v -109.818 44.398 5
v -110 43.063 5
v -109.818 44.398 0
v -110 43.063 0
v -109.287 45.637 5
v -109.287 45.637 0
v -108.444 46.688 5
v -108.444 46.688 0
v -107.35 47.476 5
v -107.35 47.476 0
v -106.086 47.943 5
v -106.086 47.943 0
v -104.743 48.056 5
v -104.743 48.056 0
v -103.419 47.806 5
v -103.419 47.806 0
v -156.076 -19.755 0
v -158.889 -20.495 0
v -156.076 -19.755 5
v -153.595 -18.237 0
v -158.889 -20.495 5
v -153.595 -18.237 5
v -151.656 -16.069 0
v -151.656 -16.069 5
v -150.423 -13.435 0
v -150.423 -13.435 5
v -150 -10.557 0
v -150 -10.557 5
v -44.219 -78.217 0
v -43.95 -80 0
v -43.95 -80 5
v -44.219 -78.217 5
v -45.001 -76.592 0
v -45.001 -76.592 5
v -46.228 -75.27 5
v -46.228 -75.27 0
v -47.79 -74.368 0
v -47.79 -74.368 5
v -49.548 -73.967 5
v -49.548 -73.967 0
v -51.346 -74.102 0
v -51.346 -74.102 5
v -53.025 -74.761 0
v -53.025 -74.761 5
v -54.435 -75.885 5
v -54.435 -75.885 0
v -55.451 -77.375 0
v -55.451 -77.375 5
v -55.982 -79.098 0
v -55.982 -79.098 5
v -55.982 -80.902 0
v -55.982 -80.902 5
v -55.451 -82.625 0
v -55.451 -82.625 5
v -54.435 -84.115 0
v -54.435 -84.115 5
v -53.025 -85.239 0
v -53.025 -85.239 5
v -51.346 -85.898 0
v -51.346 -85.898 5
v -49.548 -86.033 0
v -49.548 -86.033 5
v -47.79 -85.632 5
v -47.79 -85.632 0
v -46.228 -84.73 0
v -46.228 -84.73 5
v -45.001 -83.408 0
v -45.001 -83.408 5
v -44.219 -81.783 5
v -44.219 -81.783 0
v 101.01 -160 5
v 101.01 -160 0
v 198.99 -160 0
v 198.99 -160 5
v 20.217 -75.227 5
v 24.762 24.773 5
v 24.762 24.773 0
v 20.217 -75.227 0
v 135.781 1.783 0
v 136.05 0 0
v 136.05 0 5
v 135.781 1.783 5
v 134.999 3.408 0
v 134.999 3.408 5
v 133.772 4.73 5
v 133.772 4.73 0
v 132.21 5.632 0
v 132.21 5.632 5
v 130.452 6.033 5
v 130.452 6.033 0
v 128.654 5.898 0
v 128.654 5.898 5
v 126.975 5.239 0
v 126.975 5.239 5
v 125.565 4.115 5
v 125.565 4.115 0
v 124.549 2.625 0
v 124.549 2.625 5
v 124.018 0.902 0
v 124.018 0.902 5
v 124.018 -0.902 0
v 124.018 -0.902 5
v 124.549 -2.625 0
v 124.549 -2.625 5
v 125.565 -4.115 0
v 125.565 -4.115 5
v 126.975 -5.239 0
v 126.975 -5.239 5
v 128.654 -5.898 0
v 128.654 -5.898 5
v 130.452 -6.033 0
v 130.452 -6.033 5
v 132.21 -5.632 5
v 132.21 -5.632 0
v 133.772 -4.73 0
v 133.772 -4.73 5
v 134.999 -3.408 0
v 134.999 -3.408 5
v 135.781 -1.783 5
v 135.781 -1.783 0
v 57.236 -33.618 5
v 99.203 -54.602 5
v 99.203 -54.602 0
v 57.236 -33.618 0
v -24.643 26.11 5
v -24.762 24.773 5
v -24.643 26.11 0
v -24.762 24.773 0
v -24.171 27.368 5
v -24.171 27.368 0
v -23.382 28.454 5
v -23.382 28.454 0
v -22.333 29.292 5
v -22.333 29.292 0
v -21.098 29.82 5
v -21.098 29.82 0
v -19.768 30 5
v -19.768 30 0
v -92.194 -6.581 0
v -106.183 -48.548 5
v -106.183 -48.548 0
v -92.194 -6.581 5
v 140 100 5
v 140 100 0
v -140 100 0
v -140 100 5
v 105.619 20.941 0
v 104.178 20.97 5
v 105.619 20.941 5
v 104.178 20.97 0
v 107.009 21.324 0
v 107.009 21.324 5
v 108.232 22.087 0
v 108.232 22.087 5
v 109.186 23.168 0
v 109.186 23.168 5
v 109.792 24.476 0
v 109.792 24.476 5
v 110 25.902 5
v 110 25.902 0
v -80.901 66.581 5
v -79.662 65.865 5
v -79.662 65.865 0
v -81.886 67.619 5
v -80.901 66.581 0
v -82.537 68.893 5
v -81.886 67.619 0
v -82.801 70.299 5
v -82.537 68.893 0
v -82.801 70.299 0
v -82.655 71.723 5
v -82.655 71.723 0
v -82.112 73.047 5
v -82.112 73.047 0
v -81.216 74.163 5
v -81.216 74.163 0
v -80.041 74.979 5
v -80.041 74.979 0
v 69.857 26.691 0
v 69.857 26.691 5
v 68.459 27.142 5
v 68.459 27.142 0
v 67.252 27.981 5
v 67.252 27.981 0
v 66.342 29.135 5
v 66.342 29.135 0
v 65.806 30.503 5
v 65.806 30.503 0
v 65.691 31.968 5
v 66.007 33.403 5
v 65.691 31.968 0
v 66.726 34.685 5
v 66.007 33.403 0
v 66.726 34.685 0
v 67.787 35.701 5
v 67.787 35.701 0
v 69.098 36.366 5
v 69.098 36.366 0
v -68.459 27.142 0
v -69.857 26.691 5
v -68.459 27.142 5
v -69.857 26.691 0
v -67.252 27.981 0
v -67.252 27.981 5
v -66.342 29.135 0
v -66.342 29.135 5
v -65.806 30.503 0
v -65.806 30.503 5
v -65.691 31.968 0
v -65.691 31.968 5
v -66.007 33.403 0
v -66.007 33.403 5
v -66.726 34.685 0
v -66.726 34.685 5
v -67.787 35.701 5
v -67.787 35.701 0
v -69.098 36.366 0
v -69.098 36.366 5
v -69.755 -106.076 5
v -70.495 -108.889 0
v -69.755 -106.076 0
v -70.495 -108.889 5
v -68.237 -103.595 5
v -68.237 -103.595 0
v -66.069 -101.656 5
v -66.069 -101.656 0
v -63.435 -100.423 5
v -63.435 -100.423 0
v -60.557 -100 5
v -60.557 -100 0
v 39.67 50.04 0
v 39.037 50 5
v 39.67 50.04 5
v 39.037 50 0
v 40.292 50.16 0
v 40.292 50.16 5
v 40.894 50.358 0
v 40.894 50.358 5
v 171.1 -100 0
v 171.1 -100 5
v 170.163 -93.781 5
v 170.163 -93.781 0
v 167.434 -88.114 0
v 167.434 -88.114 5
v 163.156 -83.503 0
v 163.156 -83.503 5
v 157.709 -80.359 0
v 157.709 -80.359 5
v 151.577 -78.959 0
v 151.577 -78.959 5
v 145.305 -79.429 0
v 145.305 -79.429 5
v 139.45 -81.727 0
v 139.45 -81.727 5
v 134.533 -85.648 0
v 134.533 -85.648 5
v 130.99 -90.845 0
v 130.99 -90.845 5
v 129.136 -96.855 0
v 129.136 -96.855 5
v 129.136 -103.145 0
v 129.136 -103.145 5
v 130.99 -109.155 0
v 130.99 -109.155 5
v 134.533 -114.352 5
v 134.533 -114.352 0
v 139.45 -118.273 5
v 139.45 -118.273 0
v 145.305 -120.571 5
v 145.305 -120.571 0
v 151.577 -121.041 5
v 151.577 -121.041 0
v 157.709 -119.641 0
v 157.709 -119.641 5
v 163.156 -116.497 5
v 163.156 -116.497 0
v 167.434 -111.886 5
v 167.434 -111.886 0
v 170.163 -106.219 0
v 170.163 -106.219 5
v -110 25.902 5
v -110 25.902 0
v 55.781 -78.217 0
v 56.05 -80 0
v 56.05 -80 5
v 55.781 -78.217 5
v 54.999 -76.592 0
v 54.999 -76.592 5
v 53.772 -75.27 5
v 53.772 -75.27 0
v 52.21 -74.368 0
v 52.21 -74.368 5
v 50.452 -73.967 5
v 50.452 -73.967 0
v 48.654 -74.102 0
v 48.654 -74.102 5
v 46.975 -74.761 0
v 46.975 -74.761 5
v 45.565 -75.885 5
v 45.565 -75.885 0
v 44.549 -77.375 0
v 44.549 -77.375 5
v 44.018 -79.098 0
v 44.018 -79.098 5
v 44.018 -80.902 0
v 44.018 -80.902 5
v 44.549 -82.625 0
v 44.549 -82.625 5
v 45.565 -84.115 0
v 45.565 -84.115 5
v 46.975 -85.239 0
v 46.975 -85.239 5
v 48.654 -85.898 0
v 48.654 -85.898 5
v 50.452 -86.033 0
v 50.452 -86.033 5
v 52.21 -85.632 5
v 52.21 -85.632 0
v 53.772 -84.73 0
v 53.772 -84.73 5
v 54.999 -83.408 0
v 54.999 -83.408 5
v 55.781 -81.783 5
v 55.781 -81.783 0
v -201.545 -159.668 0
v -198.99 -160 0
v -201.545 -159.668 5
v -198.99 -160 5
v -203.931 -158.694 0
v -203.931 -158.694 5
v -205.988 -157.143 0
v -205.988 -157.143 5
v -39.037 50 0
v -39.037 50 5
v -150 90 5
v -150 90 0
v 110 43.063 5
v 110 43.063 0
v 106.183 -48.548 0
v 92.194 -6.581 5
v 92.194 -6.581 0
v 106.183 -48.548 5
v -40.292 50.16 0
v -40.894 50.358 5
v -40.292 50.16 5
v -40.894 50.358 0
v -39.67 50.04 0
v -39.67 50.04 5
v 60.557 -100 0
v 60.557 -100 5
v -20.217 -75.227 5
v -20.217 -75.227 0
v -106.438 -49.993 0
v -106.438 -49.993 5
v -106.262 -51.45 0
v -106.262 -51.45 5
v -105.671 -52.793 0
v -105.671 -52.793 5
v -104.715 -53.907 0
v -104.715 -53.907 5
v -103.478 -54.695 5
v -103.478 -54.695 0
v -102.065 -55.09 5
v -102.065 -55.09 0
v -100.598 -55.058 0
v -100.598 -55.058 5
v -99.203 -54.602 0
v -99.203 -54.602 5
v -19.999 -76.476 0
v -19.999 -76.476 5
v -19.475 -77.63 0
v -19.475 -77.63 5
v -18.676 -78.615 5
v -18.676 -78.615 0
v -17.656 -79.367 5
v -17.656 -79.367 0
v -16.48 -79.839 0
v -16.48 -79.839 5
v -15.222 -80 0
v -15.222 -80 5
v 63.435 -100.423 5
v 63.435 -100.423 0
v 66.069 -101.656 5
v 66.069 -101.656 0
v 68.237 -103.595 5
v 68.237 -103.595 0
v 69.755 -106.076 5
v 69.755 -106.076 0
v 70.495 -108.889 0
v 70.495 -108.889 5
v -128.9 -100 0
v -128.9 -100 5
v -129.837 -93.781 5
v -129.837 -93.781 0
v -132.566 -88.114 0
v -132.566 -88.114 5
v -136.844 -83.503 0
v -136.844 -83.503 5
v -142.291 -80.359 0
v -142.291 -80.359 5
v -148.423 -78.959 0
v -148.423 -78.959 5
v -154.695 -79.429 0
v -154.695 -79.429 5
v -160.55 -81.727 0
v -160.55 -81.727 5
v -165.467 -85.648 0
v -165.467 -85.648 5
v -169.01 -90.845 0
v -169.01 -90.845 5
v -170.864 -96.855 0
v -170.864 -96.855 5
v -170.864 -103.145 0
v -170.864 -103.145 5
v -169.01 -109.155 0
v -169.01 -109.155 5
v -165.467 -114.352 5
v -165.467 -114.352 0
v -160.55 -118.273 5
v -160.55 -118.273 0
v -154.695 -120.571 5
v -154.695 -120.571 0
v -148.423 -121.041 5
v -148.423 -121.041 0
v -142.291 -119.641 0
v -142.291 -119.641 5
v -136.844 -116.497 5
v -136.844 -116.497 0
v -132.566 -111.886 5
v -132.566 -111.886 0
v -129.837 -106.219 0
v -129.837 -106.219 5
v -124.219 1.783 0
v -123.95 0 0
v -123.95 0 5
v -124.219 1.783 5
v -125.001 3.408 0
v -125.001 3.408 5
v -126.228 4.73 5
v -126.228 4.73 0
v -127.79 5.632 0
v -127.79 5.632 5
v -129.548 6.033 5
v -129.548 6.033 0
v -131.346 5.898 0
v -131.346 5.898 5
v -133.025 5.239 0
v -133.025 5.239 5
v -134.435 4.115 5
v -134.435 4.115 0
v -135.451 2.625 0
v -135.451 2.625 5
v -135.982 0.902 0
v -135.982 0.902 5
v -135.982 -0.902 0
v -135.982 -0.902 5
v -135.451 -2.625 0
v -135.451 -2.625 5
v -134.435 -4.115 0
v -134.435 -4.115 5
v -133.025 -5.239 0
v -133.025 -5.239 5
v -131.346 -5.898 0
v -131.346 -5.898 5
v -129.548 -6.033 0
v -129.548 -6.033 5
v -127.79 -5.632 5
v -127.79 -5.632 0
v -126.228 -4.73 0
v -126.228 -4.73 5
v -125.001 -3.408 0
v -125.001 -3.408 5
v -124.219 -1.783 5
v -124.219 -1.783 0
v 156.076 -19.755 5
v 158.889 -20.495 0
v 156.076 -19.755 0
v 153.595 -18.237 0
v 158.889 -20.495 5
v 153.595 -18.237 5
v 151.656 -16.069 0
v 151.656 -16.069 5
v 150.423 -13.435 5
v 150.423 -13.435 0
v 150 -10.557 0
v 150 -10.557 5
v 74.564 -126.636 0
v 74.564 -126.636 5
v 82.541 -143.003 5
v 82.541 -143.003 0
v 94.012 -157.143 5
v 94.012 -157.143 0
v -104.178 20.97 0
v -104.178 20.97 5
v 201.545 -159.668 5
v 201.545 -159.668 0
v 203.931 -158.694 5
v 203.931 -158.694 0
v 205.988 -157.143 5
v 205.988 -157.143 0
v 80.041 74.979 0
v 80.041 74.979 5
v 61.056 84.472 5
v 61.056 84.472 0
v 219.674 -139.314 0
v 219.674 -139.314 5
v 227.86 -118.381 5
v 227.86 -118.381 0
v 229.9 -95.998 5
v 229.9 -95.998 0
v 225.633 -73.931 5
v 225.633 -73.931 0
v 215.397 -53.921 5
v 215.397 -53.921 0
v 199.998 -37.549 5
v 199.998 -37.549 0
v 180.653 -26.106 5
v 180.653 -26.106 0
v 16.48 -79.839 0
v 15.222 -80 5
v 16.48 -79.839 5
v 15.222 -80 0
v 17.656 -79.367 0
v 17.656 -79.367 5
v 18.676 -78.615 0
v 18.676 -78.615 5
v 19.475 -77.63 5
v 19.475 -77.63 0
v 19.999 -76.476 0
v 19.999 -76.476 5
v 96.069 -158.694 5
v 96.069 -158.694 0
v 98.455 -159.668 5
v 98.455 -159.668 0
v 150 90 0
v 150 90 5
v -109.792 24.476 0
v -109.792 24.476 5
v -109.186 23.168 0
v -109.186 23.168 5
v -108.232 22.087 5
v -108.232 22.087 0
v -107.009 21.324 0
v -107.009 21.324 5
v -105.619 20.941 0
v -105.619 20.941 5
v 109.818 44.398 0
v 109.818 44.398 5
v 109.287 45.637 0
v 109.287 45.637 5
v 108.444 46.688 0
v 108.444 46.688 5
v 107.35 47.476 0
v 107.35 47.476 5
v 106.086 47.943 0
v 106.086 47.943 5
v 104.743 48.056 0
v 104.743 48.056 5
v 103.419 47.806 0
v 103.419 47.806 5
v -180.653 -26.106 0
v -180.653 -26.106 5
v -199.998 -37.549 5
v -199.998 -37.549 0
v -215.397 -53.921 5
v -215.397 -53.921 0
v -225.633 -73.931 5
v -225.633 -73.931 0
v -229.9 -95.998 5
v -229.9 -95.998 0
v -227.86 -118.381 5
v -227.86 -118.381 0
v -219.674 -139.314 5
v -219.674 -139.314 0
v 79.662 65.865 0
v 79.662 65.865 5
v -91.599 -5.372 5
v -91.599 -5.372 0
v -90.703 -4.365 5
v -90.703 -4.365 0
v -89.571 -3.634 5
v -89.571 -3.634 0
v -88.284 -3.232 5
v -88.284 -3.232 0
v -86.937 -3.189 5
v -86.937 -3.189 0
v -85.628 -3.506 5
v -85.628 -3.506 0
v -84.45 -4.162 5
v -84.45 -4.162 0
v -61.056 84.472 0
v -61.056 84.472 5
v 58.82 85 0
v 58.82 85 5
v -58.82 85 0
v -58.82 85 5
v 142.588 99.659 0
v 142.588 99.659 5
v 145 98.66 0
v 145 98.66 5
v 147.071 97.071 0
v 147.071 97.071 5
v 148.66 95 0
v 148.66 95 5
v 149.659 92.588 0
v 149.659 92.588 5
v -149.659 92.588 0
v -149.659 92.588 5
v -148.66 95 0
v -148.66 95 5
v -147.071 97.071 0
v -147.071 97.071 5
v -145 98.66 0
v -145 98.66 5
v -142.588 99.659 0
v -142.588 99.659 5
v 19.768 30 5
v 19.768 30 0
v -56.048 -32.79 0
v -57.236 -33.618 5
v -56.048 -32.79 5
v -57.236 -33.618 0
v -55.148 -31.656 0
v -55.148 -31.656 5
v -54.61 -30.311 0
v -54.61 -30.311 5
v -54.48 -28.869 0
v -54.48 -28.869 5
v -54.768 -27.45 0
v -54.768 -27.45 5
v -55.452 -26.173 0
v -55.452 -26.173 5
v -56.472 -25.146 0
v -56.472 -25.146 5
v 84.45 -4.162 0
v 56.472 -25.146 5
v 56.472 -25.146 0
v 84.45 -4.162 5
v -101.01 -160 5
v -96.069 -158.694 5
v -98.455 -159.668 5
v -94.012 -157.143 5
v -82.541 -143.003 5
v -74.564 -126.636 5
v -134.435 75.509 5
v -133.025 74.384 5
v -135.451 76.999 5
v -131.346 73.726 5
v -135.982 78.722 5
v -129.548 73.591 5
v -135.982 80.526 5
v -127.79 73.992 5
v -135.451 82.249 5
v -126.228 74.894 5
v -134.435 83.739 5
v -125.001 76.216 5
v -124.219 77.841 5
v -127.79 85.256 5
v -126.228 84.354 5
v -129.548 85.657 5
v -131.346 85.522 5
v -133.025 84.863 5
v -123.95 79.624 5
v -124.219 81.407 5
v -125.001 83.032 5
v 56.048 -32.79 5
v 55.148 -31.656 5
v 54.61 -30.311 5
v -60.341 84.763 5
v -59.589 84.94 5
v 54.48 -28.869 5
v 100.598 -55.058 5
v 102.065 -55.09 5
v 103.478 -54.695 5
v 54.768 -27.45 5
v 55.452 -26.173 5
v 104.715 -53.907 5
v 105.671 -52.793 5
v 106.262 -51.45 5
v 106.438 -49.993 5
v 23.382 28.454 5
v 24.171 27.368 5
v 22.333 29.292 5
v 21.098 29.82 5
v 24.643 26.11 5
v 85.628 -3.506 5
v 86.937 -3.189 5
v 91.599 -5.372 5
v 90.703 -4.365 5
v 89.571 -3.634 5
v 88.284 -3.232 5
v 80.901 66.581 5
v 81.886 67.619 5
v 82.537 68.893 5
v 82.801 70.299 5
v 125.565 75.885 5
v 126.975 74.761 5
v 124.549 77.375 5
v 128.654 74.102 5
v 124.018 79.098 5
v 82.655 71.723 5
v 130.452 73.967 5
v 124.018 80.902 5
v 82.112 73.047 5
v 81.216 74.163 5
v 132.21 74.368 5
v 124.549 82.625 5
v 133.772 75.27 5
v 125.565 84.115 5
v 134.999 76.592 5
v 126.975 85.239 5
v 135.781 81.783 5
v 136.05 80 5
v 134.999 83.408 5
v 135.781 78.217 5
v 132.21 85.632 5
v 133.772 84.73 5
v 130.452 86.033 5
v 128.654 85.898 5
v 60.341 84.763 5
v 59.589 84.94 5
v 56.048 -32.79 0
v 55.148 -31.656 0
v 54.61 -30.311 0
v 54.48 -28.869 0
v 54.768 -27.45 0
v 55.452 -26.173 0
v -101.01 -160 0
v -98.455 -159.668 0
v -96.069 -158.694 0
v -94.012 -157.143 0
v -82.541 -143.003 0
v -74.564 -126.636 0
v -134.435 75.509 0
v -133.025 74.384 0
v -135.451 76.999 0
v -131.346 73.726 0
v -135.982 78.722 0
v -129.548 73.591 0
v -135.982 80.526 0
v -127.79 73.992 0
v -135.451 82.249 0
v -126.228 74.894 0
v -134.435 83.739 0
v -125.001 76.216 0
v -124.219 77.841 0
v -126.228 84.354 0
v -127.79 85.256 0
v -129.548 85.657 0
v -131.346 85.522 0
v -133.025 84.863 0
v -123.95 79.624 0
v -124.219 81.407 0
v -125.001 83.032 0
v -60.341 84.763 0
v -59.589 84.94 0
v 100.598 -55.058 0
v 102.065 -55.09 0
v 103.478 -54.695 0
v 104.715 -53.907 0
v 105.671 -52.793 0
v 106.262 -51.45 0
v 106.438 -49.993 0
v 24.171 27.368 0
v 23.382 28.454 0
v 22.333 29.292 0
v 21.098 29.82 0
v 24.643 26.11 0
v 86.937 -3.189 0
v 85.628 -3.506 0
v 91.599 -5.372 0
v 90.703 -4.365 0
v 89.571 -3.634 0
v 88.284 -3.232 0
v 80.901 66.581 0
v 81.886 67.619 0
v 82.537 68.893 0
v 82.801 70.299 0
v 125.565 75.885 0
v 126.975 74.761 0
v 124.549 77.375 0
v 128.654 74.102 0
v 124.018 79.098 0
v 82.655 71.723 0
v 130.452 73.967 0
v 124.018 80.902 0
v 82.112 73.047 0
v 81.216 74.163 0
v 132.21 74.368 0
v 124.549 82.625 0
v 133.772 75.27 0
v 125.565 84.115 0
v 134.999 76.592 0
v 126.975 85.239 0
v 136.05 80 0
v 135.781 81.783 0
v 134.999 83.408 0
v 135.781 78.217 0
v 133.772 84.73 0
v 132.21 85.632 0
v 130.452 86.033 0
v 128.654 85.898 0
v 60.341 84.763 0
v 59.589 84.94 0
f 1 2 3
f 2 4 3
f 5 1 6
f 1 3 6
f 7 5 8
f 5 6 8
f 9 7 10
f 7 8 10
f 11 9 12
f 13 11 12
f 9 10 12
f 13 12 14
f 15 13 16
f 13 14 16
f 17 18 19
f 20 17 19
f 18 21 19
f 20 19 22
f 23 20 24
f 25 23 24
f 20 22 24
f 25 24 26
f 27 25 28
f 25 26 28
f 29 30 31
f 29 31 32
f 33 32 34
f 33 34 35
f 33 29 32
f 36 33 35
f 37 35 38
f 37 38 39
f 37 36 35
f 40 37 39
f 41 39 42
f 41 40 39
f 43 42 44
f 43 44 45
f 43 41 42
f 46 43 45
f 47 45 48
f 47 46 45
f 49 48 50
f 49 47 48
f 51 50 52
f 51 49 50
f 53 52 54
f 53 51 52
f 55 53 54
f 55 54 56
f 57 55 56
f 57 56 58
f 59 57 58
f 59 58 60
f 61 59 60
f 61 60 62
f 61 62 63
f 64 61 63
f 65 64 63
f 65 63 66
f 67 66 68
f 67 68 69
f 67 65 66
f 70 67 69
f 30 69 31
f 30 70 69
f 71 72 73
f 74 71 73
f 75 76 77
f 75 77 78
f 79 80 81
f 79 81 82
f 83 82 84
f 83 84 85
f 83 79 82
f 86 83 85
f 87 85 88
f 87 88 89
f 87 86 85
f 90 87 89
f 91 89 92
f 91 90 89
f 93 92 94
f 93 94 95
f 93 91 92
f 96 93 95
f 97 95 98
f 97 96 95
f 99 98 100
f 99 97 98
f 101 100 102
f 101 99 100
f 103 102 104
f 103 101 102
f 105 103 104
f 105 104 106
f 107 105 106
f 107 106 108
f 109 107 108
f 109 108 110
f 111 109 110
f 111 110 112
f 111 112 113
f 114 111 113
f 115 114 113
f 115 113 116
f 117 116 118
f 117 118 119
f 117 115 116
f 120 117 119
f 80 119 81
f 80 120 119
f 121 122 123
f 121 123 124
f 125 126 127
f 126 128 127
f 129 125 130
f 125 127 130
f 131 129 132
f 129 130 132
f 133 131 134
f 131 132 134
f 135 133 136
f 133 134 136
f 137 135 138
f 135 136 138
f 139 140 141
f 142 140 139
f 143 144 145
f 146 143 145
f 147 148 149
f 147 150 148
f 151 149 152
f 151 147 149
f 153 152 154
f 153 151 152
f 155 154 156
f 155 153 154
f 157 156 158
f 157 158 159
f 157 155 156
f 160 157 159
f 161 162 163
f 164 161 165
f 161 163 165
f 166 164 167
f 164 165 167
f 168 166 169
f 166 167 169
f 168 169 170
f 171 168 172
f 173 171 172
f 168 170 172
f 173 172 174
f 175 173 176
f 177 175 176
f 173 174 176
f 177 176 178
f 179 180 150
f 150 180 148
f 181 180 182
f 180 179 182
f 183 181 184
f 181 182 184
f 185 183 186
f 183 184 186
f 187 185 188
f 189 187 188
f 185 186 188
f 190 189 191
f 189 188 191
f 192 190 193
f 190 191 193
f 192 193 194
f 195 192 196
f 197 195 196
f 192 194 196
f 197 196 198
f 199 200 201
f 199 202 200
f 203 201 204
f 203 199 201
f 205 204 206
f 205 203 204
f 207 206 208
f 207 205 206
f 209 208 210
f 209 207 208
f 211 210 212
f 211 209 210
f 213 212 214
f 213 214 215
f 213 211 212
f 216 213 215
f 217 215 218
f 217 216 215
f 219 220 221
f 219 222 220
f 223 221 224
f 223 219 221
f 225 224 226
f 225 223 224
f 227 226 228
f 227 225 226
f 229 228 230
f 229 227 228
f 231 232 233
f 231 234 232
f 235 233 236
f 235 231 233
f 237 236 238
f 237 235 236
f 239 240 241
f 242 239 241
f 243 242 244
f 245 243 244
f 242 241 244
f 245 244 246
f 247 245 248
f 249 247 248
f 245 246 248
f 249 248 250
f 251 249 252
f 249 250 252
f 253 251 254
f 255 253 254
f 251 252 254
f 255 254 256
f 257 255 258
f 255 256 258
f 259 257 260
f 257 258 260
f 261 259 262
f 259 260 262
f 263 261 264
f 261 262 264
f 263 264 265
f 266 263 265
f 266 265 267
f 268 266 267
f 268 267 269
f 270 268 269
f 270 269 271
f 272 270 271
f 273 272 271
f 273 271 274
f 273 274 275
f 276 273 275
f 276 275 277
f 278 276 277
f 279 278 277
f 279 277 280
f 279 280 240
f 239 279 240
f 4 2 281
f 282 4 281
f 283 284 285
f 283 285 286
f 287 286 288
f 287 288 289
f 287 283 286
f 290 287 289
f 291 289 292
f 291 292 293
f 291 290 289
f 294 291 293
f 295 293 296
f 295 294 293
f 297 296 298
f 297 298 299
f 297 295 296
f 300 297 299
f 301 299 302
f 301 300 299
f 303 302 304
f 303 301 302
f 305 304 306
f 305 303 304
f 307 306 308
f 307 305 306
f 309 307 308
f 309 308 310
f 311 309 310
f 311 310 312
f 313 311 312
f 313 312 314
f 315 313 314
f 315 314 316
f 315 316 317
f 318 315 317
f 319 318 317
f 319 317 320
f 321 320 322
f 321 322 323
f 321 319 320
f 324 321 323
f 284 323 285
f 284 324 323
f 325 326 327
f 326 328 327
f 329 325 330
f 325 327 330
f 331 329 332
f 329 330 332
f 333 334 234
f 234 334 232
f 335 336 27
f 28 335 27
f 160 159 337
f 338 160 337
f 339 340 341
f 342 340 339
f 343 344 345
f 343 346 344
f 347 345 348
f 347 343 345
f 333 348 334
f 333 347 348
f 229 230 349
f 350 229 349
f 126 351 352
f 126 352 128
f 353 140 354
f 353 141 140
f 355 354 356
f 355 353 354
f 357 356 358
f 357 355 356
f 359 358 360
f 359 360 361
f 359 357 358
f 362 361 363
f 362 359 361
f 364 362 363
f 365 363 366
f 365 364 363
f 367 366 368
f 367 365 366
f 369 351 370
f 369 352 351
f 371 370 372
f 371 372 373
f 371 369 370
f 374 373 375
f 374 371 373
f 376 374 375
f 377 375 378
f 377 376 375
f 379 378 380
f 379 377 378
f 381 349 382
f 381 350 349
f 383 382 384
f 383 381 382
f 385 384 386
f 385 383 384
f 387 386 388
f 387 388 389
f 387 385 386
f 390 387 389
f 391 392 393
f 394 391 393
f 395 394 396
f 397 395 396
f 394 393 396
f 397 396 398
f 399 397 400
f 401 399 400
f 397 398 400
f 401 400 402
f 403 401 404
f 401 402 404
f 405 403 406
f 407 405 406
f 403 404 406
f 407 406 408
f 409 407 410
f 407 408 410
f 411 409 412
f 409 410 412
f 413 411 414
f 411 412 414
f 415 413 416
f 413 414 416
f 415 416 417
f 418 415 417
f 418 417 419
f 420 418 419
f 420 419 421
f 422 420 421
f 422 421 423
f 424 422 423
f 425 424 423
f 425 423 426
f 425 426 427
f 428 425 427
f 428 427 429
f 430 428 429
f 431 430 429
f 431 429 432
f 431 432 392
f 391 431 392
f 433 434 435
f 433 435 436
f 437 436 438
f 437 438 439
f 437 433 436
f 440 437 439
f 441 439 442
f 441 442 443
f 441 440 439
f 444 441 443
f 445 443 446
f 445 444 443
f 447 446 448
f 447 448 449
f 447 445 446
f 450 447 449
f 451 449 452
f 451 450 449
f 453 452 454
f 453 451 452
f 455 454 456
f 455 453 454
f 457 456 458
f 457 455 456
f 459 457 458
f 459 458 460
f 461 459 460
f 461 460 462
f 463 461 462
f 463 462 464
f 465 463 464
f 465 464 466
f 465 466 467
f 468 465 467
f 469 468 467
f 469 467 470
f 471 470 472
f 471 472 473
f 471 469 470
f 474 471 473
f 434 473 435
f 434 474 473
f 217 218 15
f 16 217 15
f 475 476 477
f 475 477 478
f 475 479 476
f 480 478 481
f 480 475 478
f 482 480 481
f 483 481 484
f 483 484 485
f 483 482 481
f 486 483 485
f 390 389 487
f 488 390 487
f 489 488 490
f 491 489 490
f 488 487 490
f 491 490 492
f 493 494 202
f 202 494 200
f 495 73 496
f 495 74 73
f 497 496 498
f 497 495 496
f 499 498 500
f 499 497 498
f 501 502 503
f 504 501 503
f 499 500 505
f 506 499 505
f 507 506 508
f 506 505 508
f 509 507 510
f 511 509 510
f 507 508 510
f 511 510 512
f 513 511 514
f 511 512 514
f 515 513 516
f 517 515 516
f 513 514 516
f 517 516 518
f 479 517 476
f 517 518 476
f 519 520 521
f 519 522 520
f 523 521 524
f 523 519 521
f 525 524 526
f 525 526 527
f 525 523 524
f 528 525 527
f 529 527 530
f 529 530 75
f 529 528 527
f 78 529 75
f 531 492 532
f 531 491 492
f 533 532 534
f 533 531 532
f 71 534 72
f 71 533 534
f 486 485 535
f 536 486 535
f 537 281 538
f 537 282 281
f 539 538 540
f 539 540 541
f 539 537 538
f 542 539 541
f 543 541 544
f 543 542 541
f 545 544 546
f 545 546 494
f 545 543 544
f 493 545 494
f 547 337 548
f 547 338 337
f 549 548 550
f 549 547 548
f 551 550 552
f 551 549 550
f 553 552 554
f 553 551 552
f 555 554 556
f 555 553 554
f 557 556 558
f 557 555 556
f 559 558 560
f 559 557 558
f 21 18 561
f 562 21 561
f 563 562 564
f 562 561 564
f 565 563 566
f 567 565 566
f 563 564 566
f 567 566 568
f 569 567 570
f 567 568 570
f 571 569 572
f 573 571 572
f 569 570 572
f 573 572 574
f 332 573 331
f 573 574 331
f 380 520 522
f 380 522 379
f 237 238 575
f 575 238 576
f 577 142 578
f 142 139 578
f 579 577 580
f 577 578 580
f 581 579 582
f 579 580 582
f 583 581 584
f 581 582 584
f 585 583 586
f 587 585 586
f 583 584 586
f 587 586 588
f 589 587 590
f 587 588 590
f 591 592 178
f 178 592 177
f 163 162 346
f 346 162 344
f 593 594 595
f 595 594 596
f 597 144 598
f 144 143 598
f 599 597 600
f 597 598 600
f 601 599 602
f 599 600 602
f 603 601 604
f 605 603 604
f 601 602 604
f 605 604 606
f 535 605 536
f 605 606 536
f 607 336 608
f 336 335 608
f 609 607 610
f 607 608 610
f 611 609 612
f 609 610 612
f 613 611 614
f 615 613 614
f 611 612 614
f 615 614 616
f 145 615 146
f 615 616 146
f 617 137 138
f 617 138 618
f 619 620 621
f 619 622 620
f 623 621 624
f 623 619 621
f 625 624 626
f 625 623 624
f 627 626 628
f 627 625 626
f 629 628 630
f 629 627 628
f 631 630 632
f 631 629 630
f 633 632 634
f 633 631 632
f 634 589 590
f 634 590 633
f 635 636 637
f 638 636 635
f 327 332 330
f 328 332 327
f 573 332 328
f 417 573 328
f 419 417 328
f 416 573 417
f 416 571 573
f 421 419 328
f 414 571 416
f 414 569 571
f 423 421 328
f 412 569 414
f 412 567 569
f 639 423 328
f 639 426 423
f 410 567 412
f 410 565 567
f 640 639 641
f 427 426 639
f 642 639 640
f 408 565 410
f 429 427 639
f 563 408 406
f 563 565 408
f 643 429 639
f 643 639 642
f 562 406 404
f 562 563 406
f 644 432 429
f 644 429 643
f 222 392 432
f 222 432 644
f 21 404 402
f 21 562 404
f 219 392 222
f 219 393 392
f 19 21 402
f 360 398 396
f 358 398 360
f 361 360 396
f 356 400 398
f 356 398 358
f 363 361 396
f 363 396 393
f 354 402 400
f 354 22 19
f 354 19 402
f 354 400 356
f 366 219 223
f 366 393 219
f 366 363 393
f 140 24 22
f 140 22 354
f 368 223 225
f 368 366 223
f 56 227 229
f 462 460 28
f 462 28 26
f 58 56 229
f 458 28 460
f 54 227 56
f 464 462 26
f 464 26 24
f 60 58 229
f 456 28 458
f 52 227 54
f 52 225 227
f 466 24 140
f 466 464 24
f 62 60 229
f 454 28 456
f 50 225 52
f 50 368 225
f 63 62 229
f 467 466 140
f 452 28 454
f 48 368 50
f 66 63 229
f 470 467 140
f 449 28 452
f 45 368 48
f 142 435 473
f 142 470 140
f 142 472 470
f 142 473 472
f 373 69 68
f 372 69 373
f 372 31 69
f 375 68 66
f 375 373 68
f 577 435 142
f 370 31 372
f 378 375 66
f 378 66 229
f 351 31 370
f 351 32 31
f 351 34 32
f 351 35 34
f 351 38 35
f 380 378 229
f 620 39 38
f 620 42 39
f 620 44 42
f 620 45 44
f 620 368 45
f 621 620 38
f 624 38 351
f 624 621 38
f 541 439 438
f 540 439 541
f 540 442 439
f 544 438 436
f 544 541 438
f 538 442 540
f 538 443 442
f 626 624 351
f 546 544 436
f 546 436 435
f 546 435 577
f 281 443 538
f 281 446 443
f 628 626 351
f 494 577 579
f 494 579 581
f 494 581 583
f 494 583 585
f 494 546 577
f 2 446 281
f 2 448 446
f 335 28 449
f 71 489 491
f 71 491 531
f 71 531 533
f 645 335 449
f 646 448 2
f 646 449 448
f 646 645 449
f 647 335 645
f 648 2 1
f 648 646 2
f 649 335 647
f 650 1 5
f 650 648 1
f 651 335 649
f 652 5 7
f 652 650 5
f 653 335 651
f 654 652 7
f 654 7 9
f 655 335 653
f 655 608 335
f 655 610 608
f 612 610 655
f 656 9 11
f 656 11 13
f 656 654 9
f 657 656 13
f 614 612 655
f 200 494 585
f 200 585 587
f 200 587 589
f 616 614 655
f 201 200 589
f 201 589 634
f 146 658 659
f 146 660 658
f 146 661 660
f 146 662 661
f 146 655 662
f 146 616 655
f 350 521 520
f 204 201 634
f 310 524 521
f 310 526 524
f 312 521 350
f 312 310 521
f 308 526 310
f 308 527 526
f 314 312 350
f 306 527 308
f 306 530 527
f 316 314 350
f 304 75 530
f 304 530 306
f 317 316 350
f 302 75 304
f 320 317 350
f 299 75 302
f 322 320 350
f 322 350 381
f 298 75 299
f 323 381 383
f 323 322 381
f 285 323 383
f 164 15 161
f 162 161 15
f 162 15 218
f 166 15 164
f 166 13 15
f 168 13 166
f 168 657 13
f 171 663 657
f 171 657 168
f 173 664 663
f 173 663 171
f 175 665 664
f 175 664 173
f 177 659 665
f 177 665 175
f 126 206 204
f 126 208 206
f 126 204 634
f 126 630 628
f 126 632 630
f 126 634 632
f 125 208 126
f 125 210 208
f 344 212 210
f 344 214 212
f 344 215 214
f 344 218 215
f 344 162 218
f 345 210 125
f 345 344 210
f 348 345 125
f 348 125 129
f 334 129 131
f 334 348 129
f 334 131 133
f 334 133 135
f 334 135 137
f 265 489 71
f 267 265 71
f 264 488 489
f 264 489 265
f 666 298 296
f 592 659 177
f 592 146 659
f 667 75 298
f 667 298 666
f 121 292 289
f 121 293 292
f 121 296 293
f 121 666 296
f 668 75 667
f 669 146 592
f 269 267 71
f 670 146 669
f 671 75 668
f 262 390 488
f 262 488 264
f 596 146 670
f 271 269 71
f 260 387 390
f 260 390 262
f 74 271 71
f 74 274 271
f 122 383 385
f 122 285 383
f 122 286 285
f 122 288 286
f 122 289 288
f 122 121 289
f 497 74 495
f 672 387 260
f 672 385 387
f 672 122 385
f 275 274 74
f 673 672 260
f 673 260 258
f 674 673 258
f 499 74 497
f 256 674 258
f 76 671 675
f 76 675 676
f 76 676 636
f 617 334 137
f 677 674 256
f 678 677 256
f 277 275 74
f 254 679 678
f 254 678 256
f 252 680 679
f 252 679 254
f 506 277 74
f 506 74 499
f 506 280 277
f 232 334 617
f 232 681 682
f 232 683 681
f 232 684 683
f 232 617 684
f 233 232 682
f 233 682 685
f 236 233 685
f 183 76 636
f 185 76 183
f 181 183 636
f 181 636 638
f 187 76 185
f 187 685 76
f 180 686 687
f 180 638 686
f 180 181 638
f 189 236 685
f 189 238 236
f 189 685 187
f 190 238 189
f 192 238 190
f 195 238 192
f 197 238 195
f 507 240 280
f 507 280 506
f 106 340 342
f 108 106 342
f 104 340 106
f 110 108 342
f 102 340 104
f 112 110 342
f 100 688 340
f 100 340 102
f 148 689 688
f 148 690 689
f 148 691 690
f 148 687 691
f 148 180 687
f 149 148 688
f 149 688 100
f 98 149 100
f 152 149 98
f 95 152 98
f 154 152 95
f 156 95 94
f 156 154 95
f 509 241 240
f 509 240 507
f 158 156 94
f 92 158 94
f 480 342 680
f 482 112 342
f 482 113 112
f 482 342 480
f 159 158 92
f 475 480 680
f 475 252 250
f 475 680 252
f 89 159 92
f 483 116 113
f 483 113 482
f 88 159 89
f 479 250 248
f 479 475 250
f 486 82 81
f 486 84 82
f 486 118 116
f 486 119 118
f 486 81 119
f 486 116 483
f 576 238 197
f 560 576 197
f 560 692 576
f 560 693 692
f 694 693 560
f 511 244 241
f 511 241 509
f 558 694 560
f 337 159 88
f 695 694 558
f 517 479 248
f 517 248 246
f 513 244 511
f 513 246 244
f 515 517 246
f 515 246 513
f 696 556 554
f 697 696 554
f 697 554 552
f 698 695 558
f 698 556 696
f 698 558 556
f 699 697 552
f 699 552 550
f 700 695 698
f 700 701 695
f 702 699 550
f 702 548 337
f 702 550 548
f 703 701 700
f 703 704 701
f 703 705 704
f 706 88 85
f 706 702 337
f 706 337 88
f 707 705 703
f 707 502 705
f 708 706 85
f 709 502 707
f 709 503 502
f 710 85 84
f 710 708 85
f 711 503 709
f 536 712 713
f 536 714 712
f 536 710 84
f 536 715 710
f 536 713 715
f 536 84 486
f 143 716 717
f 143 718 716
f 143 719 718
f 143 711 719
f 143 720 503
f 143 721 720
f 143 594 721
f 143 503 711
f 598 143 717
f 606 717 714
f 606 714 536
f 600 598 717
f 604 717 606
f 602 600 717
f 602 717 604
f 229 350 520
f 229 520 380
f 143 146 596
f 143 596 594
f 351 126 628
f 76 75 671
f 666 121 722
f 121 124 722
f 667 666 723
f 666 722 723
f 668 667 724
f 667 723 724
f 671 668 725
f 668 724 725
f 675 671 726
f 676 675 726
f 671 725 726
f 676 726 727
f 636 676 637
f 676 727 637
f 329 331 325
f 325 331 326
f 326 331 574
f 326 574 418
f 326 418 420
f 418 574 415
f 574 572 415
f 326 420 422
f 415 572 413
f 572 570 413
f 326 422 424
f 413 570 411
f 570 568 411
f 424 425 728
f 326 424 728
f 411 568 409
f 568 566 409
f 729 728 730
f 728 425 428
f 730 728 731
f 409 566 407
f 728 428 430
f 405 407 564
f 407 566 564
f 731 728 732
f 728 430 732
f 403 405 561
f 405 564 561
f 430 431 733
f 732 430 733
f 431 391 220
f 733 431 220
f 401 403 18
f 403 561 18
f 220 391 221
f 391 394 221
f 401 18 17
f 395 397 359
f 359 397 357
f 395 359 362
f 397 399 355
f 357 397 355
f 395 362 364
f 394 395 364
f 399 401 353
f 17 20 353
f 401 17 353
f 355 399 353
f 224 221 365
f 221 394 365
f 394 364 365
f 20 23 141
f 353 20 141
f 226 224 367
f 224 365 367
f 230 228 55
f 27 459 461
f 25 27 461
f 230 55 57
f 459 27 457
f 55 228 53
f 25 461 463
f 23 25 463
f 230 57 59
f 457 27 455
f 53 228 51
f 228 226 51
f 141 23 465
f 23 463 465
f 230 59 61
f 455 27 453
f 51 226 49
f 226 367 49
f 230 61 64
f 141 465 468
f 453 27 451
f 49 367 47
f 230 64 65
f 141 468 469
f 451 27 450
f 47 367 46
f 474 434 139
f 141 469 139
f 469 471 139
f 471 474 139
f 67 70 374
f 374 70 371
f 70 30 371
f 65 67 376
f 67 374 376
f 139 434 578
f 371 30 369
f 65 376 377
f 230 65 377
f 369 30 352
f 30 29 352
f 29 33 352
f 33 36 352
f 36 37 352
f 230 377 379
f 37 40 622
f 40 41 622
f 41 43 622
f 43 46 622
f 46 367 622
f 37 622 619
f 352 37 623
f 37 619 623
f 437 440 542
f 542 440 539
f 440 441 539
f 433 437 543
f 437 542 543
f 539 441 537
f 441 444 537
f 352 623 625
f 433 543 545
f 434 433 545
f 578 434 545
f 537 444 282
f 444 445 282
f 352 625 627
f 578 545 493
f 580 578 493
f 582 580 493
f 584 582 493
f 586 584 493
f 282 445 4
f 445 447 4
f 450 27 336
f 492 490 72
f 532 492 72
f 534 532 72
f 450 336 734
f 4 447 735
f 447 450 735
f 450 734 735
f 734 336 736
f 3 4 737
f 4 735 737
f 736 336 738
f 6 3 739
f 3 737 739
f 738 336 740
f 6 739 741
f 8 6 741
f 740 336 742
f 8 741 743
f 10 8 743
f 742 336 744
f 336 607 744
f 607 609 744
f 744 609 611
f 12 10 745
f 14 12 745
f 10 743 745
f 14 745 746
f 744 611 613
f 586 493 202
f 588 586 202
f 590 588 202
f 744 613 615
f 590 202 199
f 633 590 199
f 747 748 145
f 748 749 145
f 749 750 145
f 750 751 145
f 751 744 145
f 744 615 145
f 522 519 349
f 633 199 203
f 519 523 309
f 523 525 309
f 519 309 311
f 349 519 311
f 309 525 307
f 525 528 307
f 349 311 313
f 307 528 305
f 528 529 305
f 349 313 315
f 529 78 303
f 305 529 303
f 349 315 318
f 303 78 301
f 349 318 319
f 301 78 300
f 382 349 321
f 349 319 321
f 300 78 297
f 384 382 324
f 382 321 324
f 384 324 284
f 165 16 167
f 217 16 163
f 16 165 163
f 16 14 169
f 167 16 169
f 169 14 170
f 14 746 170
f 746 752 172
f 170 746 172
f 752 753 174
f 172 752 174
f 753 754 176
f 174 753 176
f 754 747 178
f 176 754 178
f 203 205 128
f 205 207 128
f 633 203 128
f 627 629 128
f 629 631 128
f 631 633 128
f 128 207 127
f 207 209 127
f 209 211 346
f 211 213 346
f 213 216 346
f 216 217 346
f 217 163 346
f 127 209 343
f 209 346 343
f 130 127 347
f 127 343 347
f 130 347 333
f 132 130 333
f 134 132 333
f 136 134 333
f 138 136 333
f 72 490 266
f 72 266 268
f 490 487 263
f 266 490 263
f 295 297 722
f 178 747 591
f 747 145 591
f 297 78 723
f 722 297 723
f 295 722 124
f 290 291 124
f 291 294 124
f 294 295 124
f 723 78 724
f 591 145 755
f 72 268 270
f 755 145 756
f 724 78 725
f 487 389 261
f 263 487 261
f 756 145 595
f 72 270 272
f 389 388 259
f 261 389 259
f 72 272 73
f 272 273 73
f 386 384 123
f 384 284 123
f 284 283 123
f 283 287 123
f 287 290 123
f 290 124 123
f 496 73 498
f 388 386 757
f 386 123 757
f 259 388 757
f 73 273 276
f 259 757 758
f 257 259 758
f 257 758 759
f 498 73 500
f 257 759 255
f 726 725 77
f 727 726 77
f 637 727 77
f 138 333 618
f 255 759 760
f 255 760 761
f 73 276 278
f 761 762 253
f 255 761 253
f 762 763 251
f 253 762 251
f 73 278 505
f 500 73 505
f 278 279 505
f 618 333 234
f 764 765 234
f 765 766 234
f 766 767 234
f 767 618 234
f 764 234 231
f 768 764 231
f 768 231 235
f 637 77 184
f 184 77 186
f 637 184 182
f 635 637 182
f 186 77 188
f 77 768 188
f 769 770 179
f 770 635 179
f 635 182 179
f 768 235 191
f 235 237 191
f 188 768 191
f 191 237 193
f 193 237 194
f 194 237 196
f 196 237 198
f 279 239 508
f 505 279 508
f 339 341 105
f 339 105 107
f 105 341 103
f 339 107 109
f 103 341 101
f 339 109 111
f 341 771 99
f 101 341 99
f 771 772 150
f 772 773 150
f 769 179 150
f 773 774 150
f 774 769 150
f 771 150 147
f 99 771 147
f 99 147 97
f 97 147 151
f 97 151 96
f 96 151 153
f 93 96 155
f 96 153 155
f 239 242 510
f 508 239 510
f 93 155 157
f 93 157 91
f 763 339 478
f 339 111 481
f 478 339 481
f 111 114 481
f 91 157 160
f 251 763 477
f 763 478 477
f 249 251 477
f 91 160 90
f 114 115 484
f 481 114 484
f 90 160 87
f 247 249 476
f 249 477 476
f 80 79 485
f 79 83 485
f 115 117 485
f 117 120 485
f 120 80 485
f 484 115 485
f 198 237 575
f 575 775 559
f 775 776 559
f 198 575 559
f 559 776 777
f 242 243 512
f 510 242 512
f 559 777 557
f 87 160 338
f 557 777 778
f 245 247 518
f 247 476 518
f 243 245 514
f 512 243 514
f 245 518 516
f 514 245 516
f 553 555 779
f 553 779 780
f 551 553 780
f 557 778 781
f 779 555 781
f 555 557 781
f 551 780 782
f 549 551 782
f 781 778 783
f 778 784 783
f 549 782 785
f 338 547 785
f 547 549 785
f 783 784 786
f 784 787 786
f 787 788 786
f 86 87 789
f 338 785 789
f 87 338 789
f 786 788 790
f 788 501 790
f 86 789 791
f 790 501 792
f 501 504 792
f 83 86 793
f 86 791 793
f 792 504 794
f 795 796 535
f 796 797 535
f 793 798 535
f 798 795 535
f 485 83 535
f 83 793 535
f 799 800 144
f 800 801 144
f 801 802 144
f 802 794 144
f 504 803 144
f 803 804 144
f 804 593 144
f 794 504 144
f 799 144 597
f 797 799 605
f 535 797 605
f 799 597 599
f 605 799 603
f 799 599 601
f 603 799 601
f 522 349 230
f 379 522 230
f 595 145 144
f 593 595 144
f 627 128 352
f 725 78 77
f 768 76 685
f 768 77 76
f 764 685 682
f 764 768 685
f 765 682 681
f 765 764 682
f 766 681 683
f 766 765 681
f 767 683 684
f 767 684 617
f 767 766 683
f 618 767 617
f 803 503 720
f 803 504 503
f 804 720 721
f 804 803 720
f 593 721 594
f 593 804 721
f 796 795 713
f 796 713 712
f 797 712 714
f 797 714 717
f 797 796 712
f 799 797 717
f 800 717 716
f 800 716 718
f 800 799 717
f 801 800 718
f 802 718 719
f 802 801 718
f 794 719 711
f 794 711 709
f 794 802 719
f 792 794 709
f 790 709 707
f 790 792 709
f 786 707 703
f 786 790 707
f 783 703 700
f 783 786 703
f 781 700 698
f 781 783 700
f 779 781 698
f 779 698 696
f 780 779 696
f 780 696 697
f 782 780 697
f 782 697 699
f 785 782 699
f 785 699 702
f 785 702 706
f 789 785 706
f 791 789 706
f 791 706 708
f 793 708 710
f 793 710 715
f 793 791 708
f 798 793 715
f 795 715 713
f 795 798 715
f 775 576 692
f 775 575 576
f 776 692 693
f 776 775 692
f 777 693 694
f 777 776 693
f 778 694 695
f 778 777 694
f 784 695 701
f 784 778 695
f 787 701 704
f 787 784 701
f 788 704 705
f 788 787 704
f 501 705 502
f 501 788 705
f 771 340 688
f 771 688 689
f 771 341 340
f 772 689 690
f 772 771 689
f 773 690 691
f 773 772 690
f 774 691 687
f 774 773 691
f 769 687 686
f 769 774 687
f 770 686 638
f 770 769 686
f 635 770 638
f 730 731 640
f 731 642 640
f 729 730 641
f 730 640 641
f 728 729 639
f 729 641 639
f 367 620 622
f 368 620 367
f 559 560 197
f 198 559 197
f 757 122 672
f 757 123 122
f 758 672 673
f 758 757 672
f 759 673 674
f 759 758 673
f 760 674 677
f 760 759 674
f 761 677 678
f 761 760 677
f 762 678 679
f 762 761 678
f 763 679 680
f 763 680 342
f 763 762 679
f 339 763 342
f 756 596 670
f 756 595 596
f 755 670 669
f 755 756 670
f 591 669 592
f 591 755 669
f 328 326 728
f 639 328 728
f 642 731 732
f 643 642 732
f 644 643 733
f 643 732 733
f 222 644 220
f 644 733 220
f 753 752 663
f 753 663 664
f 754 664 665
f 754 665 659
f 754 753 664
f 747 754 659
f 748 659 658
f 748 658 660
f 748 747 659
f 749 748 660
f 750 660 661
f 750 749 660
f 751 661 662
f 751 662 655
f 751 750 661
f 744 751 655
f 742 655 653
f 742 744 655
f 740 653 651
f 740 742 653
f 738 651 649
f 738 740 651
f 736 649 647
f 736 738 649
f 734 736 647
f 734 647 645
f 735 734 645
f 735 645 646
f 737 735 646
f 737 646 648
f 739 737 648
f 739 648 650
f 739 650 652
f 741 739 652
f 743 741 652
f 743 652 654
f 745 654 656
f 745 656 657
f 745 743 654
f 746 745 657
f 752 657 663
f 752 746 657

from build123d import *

# Parameters (mm, degrees)
EXTRUDE_1_OUTLINE_R = 6.05
EXTRUDE_1_DEPTH     = 5
SKETCH_3_R          = 21.1
CUT_EXTRUDE_2_DEPTH = 281.223125384
FILLET_1_R          = 10
FILLET1_R           = 10
CUT_EXTRUDE1_DEPTH  = 10
FILLET2_R           = 5


# Read off the part's stored shape, not the designer's step: 凸台-拉伸1
with BuildPart() as part:
    # 凸台-拉伸1 outline → 凸台-拉伸1 (new body)
    with BuildSketch(Plane.XY):
        with BuildLine():
            ThreePointArc((-97.084973779, -160), (-77.084973779, -132.915026221), (-70, -100))
            Line((-70, -100), (70, -100))
            ThreePointArc((70, -100), (77.084973779, -132.915026221), (97.084973779, -160))
            Line((97.084973779, -160), (202.915026221, -160))
            ThreePointArc((202.915026221, -160), (224.833147735, -71.715728753), (150, -20))
            Line((150, -20), (150, 100))
            Line((150, 100), (-150, 100))
            Line((-150, 100), (-150, -20))
            ThreePointArc((-150, -20), (-224.833147735, -71.715728753), (-202.915026221, -160))
            Line((-202.915026221, -160), (-97.084973779, -160))
        make_face()
        with Locations((-50, -80)):
            Circle(EXTRUDE_1_OUTLINE_R, mode=Mode.SUBTRACT)
        with Locations((50, -80)):
            Circle(EXTRUDE_1_OUTLINE_R, mode=Mode.SUBTRACT)
        with Locations((-130, 0)):
            Circle(EXTRUDE_1_OUTLINE_R, mode=Mode.SUBTRACT)
        with Locations((-130, 79.62392947)):
            Circle(EXTRUDE_1_OUTLINE_R, mode=Mode.SUBTRACT)
        with Locations((130, 0)):
            Circle(EXTRUDE_1_OUTLINE_R, mode=Mode.SUBTRACT)
        with Locations((130, 80)):
            Circle(EXTRUDE_1_OUTLINE_R, mode=Mode.SUBTRACT)
    extrude(amount=EXTRUDE_1_DEPTH)

    # 草图3 → 切除-拉伸2 (cut, through all)
    with BuildSketch(Plane.XY.offset(5)):
        with Locations((-150, -100)):
            Circle(SKETCH_3_R)
        with Locations((150, -100)):
            Circle(SKETCH_3_R)
    extrude(amount=-CUT_EXTRUDE_2_DEPTH, mode=Mode.SUBTRACT)

    # 圆角1
    fillet_1_edges = [part.edges().sort_by_distance(p)[0] for p in [
        (-150, -20, 2.5),
        (-150, 100, 2.5),
        (150, 100, 2.5),
        (150, -20, 2.5),
        (70, -100, 2.5),
        (-70, -100, 2.5),
    ]]
    fillet(fillet_1_edges, radius=FILLET_1_R)

    # Fillet1
    fillet1_edges = [part.edges().sort_by_distance(p)[0] for p in [
        (-97.084973779, -160, 2.5),
        (-202.915026221, -160, 2.5),
        (202.915026221, -160, 2.5),
        (97.084973779, -160, 2.5),
    ]]
    fillet(fillet1_edges, radius=FILLET1_R)

    # Sketch3 → Cut-Extrude1 (cut)
    with BuildSketch(Plane.XY.offset(5)):
        Polygon((-90, 70), (-40, 50), (40, 50), (90, 70), (60, 85), (-60, 85), align=None)
        Polygon((-110, 50), (-110, 20), (-50, 30), align=None)
        Polygon((50, 30), (110, 20), (110, 50), align=None)
        Polygon((-25, 30), (25, 30), (20, -80), (-20, -80), align=None)
        Polygon((-90, 0), (-50, -30), (-110, -60), align=None)
        Polygon((50, -30), (90, 0), (110, -60), align=None)
    extrude(amount=-CUT_EXTRUDE1_DEPTH, mode=Mode.SUBTRACT)

    # Fillet2
    fillet2_edges = [part.edges().sort_by_distance(p)[0] for p in [
        (-110, -60, 2.5),
        (-90, 0, 2.5),
        (-50, -30, 2.5),
        (50, 30, 2.5),
        (110, 50, 2.5),
        (110, 20, 2.5),
        (-110, 50, 2.5),
        (-50, 30, 2.5),
        (-110, 20, 2.5),
        (-20, -80, 2.5),
        (-25, 30, 2.5),
        (25, 30, 2.5),
        (20, -80, 2.5),
        (110, -60, 2.5),
        (50, -30, 2.5),
        (90, 0, 2.5),
        (-90, 70, 2.5),
        (-60, 85, 2.5),
        (60, 85, 2.5),
        (90, 70, 2.5),
        (40, 50, 2.5),
        (-40, 50, 2.5),
    ]]
    fillet(fillet2_edges, radius=FILLET2_R)


solid = part.part
